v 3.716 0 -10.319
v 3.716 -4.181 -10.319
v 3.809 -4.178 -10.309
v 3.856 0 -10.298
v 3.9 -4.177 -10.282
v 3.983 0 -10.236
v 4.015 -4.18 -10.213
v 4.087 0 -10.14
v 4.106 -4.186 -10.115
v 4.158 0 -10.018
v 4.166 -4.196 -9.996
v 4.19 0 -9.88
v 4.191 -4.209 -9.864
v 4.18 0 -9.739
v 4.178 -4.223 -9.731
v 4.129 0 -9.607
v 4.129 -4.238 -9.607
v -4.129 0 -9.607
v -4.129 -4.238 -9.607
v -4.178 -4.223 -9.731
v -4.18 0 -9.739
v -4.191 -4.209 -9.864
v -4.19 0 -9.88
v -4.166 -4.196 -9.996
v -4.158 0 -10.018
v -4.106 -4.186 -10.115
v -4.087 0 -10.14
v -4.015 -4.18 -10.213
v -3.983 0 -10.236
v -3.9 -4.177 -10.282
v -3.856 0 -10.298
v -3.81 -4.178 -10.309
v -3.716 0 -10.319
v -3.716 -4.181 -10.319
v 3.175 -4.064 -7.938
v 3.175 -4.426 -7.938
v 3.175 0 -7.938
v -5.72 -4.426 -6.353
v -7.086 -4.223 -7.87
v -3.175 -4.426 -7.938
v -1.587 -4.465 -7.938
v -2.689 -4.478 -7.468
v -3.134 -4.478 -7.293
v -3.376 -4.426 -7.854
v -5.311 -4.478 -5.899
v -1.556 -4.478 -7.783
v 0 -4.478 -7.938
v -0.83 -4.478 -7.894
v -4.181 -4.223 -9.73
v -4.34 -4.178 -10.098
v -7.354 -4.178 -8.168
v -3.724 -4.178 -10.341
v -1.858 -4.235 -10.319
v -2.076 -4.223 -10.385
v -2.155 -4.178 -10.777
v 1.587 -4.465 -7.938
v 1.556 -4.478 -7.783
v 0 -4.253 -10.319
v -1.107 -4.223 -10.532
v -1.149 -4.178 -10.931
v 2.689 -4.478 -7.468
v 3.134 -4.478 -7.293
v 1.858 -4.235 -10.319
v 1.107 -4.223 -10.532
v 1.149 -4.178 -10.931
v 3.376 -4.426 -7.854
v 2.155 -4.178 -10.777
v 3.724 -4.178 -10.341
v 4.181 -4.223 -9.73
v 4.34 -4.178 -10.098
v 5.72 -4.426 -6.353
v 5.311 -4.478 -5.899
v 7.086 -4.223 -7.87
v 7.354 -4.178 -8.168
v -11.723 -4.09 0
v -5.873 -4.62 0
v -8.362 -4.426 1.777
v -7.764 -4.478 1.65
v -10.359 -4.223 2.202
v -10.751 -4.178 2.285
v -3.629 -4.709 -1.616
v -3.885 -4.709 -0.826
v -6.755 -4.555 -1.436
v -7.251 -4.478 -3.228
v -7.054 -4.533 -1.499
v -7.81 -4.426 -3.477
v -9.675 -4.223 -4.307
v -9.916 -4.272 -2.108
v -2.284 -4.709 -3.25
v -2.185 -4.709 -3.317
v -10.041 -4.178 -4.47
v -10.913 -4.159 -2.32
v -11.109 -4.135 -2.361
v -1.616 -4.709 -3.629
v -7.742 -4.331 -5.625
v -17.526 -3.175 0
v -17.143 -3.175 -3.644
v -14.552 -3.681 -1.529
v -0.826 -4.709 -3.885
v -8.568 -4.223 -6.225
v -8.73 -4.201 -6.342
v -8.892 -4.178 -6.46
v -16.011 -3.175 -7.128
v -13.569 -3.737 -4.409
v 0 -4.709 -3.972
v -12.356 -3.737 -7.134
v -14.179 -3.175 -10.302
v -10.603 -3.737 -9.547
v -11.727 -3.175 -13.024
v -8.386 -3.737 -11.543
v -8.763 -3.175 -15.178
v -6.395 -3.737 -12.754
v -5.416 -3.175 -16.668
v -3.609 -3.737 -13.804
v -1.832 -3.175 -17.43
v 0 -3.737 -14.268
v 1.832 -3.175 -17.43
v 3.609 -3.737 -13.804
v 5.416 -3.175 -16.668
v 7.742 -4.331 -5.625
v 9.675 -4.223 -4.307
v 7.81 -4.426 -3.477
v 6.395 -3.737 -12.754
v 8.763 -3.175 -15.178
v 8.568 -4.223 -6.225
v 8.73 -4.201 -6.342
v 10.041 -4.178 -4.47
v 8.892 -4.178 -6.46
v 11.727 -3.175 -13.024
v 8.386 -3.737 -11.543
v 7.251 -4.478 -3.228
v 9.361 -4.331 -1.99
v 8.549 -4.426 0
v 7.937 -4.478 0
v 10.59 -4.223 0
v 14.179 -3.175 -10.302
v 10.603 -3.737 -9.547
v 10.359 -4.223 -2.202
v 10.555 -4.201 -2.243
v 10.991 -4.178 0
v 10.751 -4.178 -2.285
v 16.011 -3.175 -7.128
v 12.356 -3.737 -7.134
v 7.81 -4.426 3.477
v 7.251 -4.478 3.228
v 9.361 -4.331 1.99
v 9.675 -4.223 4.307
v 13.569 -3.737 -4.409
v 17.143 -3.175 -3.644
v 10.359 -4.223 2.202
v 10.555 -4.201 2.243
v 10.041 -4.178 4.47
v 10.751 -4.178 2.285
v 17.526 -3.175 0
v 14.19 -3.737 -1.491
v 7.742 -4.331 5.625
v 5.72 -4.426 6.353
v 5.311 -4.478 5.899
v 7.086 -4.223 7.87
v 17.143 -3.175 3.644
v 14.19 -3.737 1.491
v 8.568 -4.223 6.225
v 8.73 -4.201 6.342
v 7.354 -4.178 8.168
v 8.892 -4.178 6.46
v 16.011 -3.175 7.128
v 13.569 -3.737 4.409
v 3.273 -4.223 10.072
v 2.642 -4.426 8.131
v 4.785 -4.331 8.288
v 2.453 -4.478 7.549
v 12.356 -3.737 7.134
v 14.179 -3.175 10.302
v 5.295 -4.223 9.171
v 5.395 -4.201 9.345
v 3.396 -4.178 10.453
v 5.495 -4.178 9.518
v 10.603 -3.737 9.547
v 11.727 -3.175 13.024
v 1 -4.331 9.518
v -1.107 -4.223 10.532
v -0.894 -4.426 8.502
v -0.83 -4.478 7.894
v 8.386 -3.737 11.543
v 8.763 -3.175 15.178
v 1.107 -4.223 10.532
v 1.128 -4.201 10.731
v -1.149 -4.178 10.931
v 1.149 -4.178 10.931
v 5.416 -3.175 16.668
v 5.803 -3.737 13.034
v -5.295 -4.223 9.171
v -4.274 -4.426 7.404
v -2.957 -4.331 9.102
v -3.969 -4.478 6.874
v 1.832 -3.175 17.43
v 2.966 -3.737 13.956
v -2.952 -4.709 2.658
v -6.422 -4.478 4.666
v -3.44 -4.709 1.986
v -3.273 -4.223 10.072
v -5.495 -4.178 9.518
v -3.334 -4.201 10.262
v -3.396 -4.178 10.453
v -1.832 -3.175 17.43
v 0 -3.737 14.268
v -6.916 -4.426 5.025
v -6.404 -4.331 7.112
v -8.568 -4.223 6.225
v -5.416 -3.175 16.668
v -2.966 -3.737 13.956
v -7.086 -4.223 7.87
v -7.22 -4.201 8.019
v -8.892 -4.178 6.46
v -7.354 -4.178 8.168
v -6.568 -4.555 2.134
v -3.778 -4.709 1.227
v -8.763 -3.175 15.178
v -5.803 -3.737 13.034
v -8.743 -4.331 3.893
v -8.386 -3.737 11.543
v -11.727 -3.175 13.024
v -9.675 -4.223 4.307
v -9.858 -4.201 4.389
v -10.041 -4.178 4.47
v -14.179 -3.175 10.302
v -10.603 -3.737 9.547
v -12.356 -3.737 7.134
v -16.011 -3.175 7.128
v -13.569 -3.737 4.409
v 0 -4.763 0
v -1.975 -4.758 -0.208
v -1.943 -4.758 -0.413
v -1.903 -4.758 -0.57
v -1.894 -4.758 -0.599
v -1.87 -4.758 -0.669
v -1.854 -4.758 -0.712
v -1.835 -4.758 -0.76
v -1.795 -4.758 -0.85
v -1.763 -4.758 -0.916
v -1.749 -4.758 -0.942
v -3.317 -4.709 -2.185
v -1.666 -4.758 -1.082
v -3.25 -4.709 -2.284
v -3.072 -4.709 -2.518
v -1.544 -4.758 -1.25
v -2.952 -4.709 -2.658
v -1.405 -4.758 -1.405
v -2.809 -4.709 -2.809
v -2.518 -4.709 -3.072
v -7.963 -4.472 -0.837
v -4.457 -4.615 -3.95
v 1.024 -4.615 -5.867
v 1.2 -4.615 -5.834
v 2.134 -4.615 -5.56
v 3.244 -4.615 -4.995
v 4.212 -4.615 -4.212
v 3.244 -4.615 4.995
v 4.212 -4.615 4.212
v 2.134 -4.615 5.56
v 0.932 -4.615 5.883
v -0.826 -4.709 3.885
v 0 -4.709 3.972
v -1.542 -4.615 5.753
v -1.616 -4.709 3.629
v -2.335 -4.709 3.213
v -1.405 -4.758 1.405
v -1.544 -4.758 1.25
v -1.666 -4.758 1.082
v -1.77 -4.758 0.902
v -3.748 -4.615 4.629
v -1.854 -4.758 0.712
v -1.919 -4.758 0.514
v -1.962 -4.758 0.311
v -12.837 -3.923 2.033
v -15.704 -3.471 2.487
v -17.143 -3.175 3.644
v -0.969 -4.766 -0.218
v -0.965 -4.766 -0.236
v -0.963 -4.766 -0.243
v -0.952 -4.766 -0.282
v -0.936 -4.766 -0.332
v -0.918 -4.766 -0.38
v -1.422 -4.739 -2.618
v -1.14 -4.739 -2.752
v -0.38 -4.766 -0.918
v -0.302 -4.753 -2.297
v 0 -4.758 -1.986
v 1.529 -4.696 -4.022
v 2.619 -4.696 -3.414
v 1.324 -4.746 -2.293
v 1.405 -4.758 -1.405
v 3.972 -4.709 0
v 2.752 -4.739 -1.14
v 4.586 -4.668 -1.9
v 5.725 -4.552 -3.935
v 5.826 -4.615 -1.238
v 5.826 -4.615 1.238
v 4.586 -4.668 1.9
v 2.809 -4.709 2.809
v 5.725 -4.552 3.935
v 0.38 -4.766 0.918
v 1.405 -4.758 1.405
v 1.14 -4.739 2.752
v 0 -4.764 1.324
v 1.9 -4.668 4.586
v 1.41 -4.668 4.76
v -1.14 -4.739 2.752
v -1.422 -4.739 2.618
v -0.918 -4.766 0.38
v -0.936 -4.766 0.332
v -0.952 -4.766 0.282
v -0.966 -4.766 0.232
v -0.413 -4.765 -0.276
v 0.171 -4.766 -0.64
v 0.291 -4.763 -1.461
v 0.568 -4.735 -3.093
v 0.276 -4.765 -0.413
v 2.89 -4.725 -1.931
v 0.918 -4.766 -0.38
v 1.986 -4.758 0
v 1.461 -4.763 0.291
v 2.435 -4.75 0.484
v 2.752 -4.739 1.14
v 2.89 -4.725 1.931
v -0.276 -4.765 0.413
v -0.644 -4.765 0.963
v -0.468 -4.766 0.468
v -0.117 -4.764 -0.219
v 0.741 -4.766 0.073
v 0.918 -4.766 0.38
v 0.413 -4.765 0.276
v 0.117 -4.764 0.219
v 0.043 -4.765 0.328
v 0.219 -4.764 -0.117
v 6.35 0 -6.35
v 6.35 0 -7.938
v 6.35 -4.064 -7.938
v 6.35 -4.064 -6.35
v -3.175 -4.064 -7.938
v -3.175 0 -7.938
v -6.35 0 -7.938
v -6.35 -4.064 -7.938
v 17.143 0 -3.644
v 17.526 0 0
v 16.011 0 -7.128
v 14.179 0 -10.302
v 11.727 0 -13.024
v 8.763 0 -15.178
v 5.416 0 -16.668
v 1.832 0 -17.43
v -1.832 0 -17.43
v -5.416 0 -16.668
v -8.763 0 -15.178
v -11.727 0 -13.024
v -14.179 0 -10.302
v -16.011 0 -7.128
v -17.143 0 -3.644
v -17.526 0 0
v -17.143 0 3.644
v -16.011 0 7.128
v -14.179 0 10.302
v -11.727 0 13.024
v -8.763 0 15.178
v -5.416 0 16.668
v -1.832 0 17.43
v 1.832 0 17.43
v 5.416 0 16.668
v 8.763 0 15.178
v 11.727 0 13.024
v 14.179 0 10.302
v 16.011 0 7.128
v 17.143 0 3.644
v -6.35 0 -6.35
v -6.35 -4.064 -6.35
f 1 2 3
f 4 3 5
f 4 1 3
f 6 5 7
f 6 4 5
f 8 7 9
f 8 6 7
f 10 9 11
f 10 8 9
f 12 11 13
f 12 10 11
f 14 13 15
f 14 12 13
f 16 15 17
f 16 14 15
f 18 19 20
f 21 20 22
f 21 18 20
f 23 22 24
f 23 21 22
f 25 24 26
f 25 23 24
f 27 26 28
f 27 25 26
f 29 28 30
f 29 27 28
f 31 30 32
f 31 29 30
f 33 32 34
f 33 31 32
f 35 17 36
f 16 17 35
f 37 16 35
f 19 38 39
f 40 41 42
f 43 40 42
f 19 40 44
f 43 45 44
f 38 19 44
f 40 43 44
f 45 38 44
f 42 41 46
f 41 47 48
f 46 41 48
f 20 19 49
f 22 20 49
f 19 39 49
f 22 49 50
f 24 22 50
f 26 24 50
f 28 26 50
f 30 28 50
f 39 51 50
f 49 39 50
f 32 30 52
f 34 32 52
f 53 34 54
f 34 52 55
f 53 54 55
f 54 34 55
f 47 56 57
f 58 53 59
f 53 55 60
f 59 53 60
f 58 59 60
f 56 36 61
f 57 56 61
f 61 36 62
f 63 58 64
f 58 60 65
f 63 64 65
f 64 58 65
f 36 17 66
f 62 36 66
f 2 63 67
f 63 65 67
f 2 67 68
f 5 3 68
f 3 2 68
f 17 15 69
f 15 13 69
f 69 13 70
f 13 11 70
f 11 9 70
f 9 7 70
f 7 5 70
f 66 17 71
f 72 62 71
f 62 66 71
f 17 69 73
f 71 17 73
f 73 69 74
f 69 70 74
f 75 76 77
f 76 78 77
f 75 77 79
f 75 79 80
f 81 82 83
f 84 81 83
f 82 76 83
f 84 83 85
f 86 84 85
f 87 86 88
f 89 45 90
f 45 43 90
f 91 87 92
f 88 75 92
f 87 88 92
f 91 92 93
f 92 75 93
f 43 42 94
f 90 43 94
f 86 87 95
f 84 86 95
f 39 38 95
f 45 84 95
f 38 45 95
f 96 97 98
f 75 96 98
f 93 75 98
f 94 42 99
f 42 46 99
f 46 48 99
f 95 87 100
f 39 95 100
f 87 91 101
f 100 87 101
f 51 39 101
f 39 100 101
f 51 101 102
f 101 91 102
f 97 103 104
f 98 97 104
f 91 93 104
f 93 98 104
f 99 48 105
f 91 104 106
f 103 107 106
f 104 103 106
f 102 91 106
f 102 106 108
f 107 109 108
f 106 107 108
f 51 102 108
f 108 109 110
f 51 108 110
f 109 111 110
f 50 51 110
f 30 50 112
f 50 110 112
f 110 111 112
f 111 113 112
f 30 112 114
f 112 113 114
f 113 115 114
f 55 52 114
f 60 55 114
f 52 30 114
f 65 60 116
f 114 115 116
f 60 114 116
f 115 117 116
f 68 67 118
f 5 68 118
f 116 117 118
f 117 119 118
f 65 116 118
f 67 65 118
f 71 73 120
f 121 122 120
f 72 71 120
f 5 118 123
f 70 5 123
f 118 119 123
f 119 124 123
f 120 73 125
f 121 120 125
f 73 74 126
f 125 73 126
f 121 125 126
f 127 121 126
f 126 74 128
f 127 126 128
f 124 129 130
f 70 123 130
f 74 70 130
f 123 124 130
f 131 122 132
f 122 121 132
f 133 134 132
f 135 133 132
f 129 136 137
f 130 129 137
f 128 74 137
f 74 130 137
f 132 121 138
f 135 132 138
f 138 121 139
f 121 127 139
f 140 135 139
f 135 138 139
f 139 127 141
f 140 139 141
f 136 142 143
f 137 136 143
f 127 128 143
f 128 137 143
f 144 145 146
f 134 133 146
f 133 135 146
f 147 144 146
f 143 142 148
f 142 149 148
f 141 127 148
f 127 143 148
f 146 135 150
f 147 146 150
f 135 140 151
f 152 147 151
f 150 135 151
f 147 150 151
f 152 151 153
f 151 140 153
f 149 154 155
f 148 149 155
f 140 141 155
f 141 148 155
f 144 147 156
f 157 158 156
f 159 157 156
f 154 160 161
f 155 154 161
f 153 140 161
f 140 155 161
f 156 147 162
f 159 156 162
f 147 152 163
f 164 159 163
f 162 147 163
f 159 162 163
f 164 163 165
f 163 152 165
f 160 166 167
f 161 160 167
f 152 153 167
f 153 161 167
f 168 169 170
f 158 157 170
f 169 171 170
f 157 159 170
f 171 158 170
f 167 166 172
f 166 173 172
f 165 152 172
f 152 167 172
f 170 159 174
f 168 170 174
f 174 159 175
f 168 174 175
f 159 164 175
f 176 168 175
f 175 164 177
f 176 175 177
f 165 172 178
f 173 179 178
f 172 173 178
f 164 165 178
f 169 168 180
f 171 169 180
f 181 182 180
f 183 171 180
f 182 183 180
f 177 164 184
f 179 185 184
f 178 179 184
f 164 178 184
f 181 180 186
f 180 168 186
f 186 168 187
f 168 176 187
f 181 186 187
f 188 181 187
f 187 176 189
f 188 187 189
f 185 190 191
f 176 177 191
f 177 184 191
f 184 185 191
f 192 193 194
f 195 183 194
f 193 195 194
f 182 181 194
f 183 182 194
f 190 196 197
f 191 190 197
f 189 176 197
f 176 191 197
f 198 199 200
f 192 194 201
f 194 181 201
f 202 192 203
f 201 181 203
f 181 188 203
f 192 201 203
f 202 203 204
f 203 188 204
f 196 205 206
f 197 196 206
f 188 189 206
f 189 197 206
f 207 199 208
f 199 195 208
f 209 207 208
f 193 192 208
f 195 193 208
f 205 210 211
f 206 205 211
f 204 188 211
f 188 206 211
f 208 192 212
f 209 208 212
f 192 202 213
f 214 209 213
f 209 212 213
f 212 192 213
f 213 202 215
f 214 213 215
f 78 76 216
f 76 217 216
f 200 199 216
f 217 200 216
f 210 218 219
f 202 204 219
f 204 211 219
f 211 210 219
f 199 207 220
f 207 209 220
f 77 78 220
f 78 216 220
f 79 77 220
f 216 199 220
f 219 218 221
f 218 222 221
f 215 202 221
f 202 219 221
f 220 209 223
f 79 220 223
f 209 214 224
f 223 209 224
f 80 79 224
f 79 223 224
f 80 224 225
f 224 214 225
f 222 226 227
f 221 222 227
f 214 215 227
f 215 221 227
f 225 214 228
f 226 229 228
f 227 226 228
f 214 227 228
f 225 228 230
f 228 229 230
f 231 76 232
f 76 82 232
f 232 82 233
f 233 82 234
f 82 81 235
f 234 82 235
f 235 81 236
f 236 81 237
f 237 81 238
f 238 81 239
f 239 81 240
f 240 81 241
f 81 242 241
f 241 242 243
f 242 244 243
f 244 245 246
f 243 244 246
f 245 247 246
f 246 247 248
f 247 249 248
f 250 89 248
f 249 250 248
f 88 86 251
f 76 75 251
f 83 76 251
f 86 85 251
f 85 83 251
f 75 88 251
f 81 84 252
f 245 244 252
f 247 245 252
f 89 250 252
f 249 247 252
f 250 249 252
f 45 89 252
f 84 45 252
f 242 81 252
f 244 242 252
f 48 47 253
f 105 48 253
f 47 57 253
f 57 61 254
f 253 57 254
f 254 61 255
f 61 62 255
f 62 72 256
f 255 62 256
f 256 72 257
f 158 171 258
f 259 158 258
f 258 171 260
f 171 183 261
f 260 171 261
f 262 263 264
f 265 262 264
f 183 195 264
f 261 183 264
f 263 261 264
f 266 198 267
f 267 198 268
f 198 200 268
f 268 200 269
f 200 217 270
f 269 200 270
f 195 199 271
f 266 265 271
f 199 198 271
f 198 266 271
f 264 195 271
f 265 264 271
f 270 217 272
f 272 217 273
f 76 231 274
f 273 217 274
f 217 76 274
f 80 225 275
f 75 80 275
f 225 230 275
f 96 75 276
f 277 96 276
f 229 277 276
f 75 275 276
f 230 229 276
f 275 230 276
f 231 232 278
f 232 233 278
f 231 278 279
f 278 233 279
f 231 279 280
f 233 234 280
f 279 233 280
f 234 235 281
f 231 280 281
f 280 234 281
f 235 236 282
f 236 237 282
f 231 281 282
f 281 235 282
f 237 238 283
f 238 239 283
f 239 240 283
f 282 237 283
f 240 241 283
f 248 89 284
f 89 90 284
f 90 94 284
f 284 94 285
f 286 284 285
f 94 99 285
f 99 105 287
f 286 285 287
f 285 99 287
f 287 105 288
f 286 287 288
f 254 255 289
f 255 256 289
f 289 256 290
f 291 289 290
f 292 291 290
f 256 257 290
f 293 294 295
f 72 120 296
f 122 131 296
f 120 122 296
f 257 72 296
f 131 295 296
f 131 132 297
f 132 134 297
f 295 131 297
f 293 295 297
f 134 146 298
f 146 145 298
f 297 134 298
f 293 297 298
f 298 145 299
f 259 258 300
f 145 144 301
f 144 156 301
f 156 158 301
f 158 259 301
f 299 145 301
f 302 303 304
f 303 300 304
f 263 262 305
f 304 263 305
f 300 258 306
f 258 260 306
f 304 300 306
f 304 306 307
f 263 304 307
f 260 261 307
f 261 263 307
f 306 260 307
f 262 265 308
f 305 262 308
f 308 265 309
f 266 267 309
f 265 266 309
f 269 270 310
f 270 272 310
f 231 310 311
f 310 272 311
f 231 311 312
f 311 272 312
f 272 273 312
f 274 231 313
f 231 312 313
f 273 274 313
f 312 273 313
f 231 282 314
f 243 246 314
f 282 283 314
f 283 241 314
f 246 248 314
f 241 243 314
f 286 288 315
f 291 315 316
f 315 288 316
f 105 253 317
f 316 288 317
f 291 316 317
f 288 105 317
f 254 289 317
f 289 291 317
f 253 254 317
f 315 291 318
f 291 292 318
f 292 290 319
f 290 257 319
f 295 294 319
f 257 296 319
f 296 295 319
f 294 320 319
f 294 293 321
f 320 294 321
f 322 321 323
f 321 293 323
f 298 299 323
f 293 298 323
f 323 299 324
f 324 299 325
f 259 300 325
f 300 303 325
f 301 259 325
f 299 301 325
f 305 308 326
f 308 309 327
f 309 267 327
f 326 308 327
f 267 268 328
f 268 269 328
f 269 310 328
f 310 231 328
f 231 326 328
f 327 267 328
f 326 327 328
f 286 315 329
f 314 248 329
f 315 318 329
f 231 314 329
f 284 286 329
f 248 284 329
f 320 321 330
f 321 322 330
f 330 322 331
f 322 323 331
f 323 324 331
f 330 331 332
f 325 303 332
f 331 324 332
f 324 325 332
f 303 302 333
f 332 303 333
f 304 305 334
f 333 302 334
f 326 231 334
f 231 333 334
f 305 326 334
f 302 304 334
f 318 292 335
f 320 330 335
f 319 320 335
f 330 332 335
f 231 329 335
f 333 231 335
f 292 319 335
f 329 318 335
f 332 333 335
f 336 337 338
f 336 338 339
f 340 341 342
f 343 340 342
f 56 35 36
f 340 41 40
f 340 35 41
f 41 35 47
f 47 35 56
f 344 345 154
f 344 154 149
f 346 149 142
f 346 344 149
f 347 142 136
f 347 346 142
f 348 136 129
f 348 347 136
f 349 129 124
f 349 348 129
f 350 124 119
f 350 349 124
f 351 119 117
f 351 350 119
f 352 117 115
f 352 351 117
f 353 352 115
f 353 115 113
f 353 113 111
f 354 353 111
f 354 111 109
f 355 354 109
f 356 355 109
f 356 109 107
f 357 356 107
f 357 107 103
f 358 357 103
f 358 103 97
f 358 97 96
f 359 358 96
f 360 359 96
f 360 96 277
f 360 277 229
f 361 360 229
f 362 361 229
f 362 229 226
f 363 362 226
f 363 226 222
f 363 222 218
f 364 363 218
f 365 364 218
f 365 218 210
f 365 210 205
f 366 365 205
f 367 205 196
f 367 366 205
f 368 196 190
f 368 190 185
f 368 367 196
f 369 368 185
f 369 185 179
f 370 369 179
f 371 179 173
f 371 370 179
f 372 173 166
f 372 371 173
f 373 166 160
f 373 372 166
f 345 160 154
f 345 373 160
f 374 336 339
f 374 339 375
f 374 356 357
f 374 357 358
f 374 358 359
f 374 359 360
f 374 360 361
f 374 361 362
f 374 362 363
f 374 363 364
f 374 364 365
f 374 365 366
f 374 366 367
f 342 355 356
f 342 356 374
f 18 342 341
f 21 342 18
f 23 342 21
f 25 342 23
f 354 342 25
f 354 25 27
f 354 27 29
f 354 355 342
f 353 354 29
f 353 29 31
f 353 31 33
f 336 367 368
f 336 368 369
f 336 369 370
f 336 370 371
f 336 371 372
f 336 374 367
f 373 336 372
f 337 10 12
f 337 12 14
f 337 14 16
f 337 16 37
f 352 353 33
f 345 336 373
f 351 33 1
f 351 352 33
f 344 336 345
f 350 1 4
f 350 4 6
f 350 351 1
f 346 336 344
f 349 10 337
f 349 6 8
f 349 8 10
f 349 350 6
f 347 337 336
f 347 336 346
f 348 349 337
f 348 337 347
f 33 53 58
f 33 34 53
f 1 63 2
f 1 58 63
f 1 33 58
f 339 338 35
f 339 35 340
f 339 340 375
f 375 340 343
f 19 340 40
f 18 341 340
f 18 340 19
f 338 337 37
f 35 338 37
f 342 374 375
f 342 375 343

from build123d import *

# Parameters (mm, degrees)
SKETCH1_R           = 17.526
BOSS_EXTRUDE1_DEPTH = 3.175
CUT_EXTRUDE2_DEPTH  = 4.572
CUT_EXTRUDE3_DEPTH  = 4.064


with BuildPart() as part:
    # Sketch1 → Boss-Extrude1 (new body)
    with BuildSketch(Plane(origin=(0, 0, 0), x_dir=(1, 0, 0), z_dir=(0, 1, 0))):
        Circle(SKETCH1_R)
    extrude(amount=-BOSS_EXTRUDE1_DEPTH)

    # Sketch2 → Revolve2 (revolve)
    with BuildSketch(Plane.XY):
        with BuildLine():
            Line((-17.526, -3.175), (0, -3.175))
            Line((0, -3.175), (0, -4.7625))
            ThreePointArc((0, -4.7625), (-8.802377367, -4.403476128), (-17.526, -3.175))
        make_face()
    revolve(axis=Axis((0, 7.394642586, 0), (0, -1, 0)))

    # Sketch4 → Cut-Extrude2 (cut)
    with BuildSketch(Plane(origin=(0, 0, 0), x_dir=(1, 0, 0), z_dir=(0, 1, 0))):
        with BuildLine():
            Line((-4.128730565, 9.60699682), (-3.175, 7.9375))
            Line((-3.175, 7.9375), (3.175, 7.9375))
            Line((3.175, 7.9375), (4.128730565, 9.60699682))
            ThreePointArc((4.128730565, 9.60699682), (4.127101881, 10.081811553), (3.715626661, 10.31875))
            Line((3.715626661, 10.31875), (-3.715626661, 10.31875))
            ThreePointArc((-3.715626661, 10.31875), (-4.127101881, 10.081811553), (-4.128730565, 9.60699682))
        make_face()
    extrude(amount=-CUT_EXTRUDE2_DEPTH, mode=Mode.SUBTRACT)

    # Sketch4<4> → Cut-Extrude3 (cut)
    with BuildSketch(Plane(origin=(0, 0, 0), x_dir=(1, 0, 0), z_dir=(0, 1, 0))):
        Polygon((3.175, 7.9375), (-3.175, 7.9375), (-6.35, 7.9375), (-6.35, 6.35), (6.35, 6.35), (6.35, 7.9375), align=None)
    extrude(amount=-CUT_EXTRUDE3_DEPTH, mode=Mode.SUBTRACT)


solid = part.part
